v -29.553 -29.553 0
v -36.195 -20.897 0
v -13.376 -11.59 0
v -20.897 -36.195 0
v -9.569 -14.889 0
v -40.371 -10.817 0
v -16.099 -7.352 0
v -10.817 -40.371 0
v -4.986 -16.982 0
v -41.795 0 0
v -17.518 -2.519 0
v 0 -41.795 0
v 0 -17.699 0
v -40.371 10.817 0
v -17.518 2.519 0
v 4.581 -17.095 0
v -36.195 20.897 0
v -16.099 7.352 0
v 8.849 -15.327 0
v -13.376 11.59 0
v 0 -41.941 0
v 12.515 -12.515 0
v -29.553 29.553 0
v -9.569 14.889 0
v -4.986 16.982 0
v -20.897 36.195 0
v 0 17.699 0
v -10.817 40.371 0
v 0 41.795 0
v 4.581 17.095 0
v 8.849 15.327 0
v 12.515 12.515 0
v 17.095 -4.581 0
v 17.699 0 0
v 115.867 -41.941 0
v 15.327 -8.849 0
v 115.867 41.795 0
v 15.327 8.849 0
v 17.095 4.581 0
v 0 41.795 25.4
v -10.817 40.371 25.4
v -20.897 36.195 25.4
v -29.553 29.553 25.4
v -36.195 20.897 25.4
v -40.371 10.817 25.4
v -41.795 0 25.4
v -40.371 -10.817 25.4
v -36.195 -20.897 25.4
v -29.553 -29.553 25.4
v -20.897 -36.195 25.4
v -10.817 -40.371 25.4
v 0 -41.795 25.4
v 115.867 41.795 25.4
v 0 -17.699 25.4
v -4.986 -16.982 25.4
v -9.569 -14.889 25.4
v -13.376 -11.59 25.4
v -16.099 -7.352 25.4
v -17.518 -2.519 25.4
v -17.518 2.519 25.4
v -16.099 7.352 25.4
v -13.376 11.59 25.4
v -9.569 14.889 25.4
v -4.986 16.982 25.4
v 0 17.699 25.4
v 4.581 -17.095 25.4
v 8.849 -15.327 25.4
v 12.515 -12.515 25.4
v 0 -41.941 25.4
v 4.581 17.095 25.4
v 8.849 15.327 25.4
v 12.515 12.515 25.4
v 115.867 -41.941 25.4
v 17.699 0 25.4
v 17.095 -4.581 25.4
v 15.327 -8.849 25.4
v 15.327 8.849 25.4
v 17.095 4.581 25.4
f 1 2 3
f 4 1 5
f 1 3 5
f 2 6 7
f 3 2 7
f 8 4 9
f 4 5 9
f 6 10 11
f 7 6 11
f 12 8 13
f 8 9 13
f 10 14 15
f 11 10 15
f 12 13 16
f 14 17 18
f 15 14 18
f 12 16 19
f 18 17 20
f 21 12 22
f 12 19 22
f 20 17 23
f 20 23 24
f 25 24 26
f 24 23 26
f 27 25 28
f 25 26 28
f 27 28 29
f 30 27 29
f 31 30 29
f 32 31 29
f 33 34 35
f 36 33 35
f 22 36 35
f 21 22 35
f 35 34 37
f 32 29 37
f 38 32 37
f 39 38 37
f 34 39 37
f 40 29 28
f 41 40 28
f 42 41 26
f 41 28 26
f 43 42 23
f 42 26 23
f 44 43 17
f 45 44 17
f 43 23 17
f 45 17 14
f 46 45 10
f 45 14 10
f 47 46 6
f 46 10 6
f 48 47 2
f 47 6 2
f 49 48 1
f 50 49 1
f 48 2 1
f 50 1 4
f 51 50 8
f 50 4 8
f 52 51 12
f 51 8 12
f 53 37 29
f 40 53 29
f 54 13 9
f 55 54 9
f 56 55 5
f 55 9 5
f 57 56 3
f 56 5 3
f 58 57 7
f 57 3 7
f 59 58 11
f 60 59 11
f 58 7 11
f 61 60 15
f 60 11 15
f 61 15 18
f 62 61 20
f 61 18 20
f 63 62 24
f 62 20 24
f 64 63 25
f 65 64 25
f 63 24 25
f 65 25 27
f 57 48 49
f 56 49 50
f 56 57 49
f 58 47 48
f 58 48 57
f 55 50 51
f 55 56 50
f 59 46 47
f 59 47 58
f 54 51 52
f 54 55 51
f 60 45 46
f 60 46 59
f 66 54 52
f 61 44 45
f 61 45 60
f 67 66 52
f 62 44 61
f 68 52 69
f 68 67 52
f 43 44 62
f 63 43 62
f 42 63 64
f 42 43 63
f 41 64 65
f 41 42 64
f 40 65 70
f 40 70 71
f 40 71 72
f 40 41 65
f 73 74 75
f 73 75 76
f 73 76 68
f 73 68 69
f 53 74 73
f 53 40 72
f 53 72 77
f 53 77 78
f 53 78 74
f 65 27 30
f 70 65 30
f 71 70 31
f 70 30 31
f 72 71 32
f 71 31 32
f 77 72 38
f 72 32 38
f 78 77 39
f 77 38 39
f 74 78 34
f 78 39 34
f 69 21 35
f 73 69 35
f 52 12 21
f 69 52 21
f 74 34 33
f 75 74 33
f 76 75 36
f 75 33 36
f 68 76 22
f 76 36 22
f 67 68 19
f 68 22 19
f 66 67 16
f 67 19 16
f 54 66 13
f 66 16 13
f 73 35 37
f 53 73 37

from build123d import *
from build123d import SkipClean  # not in build123d's __all__

# Parameters (mm, degrees)
F1_DEPTH  = 25.4
F1_FACE_R = 17.6985452631
F2_DEPTH  = 25.4
F3_DEPTH  = 25.4


with BuildPart() as f1:
    # F0 (on Top) → F1 (new body)
    with BuildSketch(Plane.XY):
        with BuildLine():
            ThreePointArc((0, 41.7947099158), (29.5533227992, 29.5533227992), (41.7947099158, 0))
            ThreePointArc((41.7947099158, 0), (29.5533227992, -29.5533227992), (0, -41.7947099158))
            Line((0, -41.7947099158), (0, -41.9407263398))
            Line((0, -41.9407263398), (115.8670112491, -41.9407263398))
            Line((115.8670112491, -41.9407263398), (115.8670112491, 41.7947099158))
            Line((115.8670112491, 41.7947099158), (0, 41.7947099158))
        make_face()
        with BuildLine():
            ThreePointArc((0, -41.7947099158), (29.5533227992, -29.5533227992), (41.7947099158, 0))
            ThreePointArc((41.7947099158, 0), (29.5533227992, 29.5533227992), (0, 41.7947099158))
            Line((0, 41.7947099158), (0, 17.6985452631))
            ThreePointArc((0, 17.6985452631), (12.5147613727, 12.5147613727), (17.6985452631, 0))
            ThreePointArc((17.6985452631, 0), (12.5147613727, -12.5147613727), (0, -17.6985452631))
            Line((0, -17.6985452631), (0, -41.7947099158))
        make_face()
        with BuildLine():
            Line((0, 17.6985452631), (0, 41.7947099158))
            ThreePointArc((0, 41.7947099158), (-41.7947099158, 0), (0, -41.7947099158))
            Line((0, -41.7947099158), (0, -17.6985452631))
            ThreePointArc((0, -17.6985452631), (-17.6985452631, 0), (0, 17.6985452631))
        make_face()
    extrude(amount=F1_DEPTH)

    # F1_face (on face) + F0 (on Top) → F2 (join)
    with BuildSketch(Plane(origin=(44.792448598, -0.0617990101, 25.4), x_dir=(1, 0, 0), z_dir=(0, 0, 1))):
        with BuildLine():
            Line((71.0745626511, 41.8565089259), (-44.792448598, 41.8565089259))
            ThreePointArc((-44.792448598, 41.8565089259), (-86.5871585138, 0.0617990101), (-44.792448598, -41.7329109057))
            Line((-44.792448598, -41.7329109057), (-44.792448598, -41.8789273297))
            Line((-44.792448598, -41.8789273297), (71.0745626511, -41.8789273297))
            Line((71.0745626511, -41.8789273297), (71.0745626511, 41.8565089259))
        make_face()
        with Locations((-44.792448598, 0.0617990101)):
            Circle(F1_FACE_R, mode=Mode.SUBTRACT)
    with BuildSketch(Plane.XY):
        with BuildLine():
            ThreePointArc((0, -41.7947099158), (29.5533227992, -29.5533227992), (41.7947099158, 0))
            ThreePointArc((41.7947099158, 0), (29.5533227992, 29.5533227992), (0, 41.7947099158))
            Line((0, 41.7947099158), (0, 17.6985452631))
            ThreePointArc((0, 17.6985452631), (12.5147613727, 12.5147613727), (17.6985452631, 0))
            ThreePointArc((17.6985452631, 0), (12.5147613727, -12.5147613727), (0, -17.6985452631))
            Line((0, -17.6985452631), (0, -41.7947099158))
        make_face()
        with BuildLine():
            ThreePointArc((0, 41.7947099158), (29.5533227992, 29.5533227992), (41.7947099158, 0))
            ThreePointArc((41.7947099158, 0), (29.5533227992, -29.5533227992), (0, -41.7947099158))
            Line((0, -41.7947099158), (0, -41.9407263398))
            Line((0, -41.9407263398), (115.8670112491, -41.9407263398))
            Line((115.8670112491, -41.9407263398), (115.8670112491, 41.7947099158))
            Line((115.8670112491, 41.7947099158), (0, 41.7947099158))
        make_face()
        with BuildLine():
            Line((0, 17.6985452631), (0, 41.7947099158))
            ThreePointArc((0, 41.7947099158), (-41.7947099158, 0), (0, -41.7947099158))
            Line((0, -41.7947099158), (0, -17.6985452631))
            ThreePointArc((0, -17.6985452631), (-17.6985452631, 0), (0, 17.6985452631))
        make_face()
    with SkipClean():  # cleaning this boolean's faces spoils the solid; the shape is the same uncleaned
        extrude(amount=F2_DEPTH)

    # F3 (cut): a face of the model
    f3_faces = [f1.faces().sort_by_distance(p)[0] for p in [
        (44.792448598, -0.0617990101, 50.8),
    ]]
    extrude(f3_faces, amount=-F3_DEPTH, mode=Mode.SUBTRACT)


solid = f1.part
